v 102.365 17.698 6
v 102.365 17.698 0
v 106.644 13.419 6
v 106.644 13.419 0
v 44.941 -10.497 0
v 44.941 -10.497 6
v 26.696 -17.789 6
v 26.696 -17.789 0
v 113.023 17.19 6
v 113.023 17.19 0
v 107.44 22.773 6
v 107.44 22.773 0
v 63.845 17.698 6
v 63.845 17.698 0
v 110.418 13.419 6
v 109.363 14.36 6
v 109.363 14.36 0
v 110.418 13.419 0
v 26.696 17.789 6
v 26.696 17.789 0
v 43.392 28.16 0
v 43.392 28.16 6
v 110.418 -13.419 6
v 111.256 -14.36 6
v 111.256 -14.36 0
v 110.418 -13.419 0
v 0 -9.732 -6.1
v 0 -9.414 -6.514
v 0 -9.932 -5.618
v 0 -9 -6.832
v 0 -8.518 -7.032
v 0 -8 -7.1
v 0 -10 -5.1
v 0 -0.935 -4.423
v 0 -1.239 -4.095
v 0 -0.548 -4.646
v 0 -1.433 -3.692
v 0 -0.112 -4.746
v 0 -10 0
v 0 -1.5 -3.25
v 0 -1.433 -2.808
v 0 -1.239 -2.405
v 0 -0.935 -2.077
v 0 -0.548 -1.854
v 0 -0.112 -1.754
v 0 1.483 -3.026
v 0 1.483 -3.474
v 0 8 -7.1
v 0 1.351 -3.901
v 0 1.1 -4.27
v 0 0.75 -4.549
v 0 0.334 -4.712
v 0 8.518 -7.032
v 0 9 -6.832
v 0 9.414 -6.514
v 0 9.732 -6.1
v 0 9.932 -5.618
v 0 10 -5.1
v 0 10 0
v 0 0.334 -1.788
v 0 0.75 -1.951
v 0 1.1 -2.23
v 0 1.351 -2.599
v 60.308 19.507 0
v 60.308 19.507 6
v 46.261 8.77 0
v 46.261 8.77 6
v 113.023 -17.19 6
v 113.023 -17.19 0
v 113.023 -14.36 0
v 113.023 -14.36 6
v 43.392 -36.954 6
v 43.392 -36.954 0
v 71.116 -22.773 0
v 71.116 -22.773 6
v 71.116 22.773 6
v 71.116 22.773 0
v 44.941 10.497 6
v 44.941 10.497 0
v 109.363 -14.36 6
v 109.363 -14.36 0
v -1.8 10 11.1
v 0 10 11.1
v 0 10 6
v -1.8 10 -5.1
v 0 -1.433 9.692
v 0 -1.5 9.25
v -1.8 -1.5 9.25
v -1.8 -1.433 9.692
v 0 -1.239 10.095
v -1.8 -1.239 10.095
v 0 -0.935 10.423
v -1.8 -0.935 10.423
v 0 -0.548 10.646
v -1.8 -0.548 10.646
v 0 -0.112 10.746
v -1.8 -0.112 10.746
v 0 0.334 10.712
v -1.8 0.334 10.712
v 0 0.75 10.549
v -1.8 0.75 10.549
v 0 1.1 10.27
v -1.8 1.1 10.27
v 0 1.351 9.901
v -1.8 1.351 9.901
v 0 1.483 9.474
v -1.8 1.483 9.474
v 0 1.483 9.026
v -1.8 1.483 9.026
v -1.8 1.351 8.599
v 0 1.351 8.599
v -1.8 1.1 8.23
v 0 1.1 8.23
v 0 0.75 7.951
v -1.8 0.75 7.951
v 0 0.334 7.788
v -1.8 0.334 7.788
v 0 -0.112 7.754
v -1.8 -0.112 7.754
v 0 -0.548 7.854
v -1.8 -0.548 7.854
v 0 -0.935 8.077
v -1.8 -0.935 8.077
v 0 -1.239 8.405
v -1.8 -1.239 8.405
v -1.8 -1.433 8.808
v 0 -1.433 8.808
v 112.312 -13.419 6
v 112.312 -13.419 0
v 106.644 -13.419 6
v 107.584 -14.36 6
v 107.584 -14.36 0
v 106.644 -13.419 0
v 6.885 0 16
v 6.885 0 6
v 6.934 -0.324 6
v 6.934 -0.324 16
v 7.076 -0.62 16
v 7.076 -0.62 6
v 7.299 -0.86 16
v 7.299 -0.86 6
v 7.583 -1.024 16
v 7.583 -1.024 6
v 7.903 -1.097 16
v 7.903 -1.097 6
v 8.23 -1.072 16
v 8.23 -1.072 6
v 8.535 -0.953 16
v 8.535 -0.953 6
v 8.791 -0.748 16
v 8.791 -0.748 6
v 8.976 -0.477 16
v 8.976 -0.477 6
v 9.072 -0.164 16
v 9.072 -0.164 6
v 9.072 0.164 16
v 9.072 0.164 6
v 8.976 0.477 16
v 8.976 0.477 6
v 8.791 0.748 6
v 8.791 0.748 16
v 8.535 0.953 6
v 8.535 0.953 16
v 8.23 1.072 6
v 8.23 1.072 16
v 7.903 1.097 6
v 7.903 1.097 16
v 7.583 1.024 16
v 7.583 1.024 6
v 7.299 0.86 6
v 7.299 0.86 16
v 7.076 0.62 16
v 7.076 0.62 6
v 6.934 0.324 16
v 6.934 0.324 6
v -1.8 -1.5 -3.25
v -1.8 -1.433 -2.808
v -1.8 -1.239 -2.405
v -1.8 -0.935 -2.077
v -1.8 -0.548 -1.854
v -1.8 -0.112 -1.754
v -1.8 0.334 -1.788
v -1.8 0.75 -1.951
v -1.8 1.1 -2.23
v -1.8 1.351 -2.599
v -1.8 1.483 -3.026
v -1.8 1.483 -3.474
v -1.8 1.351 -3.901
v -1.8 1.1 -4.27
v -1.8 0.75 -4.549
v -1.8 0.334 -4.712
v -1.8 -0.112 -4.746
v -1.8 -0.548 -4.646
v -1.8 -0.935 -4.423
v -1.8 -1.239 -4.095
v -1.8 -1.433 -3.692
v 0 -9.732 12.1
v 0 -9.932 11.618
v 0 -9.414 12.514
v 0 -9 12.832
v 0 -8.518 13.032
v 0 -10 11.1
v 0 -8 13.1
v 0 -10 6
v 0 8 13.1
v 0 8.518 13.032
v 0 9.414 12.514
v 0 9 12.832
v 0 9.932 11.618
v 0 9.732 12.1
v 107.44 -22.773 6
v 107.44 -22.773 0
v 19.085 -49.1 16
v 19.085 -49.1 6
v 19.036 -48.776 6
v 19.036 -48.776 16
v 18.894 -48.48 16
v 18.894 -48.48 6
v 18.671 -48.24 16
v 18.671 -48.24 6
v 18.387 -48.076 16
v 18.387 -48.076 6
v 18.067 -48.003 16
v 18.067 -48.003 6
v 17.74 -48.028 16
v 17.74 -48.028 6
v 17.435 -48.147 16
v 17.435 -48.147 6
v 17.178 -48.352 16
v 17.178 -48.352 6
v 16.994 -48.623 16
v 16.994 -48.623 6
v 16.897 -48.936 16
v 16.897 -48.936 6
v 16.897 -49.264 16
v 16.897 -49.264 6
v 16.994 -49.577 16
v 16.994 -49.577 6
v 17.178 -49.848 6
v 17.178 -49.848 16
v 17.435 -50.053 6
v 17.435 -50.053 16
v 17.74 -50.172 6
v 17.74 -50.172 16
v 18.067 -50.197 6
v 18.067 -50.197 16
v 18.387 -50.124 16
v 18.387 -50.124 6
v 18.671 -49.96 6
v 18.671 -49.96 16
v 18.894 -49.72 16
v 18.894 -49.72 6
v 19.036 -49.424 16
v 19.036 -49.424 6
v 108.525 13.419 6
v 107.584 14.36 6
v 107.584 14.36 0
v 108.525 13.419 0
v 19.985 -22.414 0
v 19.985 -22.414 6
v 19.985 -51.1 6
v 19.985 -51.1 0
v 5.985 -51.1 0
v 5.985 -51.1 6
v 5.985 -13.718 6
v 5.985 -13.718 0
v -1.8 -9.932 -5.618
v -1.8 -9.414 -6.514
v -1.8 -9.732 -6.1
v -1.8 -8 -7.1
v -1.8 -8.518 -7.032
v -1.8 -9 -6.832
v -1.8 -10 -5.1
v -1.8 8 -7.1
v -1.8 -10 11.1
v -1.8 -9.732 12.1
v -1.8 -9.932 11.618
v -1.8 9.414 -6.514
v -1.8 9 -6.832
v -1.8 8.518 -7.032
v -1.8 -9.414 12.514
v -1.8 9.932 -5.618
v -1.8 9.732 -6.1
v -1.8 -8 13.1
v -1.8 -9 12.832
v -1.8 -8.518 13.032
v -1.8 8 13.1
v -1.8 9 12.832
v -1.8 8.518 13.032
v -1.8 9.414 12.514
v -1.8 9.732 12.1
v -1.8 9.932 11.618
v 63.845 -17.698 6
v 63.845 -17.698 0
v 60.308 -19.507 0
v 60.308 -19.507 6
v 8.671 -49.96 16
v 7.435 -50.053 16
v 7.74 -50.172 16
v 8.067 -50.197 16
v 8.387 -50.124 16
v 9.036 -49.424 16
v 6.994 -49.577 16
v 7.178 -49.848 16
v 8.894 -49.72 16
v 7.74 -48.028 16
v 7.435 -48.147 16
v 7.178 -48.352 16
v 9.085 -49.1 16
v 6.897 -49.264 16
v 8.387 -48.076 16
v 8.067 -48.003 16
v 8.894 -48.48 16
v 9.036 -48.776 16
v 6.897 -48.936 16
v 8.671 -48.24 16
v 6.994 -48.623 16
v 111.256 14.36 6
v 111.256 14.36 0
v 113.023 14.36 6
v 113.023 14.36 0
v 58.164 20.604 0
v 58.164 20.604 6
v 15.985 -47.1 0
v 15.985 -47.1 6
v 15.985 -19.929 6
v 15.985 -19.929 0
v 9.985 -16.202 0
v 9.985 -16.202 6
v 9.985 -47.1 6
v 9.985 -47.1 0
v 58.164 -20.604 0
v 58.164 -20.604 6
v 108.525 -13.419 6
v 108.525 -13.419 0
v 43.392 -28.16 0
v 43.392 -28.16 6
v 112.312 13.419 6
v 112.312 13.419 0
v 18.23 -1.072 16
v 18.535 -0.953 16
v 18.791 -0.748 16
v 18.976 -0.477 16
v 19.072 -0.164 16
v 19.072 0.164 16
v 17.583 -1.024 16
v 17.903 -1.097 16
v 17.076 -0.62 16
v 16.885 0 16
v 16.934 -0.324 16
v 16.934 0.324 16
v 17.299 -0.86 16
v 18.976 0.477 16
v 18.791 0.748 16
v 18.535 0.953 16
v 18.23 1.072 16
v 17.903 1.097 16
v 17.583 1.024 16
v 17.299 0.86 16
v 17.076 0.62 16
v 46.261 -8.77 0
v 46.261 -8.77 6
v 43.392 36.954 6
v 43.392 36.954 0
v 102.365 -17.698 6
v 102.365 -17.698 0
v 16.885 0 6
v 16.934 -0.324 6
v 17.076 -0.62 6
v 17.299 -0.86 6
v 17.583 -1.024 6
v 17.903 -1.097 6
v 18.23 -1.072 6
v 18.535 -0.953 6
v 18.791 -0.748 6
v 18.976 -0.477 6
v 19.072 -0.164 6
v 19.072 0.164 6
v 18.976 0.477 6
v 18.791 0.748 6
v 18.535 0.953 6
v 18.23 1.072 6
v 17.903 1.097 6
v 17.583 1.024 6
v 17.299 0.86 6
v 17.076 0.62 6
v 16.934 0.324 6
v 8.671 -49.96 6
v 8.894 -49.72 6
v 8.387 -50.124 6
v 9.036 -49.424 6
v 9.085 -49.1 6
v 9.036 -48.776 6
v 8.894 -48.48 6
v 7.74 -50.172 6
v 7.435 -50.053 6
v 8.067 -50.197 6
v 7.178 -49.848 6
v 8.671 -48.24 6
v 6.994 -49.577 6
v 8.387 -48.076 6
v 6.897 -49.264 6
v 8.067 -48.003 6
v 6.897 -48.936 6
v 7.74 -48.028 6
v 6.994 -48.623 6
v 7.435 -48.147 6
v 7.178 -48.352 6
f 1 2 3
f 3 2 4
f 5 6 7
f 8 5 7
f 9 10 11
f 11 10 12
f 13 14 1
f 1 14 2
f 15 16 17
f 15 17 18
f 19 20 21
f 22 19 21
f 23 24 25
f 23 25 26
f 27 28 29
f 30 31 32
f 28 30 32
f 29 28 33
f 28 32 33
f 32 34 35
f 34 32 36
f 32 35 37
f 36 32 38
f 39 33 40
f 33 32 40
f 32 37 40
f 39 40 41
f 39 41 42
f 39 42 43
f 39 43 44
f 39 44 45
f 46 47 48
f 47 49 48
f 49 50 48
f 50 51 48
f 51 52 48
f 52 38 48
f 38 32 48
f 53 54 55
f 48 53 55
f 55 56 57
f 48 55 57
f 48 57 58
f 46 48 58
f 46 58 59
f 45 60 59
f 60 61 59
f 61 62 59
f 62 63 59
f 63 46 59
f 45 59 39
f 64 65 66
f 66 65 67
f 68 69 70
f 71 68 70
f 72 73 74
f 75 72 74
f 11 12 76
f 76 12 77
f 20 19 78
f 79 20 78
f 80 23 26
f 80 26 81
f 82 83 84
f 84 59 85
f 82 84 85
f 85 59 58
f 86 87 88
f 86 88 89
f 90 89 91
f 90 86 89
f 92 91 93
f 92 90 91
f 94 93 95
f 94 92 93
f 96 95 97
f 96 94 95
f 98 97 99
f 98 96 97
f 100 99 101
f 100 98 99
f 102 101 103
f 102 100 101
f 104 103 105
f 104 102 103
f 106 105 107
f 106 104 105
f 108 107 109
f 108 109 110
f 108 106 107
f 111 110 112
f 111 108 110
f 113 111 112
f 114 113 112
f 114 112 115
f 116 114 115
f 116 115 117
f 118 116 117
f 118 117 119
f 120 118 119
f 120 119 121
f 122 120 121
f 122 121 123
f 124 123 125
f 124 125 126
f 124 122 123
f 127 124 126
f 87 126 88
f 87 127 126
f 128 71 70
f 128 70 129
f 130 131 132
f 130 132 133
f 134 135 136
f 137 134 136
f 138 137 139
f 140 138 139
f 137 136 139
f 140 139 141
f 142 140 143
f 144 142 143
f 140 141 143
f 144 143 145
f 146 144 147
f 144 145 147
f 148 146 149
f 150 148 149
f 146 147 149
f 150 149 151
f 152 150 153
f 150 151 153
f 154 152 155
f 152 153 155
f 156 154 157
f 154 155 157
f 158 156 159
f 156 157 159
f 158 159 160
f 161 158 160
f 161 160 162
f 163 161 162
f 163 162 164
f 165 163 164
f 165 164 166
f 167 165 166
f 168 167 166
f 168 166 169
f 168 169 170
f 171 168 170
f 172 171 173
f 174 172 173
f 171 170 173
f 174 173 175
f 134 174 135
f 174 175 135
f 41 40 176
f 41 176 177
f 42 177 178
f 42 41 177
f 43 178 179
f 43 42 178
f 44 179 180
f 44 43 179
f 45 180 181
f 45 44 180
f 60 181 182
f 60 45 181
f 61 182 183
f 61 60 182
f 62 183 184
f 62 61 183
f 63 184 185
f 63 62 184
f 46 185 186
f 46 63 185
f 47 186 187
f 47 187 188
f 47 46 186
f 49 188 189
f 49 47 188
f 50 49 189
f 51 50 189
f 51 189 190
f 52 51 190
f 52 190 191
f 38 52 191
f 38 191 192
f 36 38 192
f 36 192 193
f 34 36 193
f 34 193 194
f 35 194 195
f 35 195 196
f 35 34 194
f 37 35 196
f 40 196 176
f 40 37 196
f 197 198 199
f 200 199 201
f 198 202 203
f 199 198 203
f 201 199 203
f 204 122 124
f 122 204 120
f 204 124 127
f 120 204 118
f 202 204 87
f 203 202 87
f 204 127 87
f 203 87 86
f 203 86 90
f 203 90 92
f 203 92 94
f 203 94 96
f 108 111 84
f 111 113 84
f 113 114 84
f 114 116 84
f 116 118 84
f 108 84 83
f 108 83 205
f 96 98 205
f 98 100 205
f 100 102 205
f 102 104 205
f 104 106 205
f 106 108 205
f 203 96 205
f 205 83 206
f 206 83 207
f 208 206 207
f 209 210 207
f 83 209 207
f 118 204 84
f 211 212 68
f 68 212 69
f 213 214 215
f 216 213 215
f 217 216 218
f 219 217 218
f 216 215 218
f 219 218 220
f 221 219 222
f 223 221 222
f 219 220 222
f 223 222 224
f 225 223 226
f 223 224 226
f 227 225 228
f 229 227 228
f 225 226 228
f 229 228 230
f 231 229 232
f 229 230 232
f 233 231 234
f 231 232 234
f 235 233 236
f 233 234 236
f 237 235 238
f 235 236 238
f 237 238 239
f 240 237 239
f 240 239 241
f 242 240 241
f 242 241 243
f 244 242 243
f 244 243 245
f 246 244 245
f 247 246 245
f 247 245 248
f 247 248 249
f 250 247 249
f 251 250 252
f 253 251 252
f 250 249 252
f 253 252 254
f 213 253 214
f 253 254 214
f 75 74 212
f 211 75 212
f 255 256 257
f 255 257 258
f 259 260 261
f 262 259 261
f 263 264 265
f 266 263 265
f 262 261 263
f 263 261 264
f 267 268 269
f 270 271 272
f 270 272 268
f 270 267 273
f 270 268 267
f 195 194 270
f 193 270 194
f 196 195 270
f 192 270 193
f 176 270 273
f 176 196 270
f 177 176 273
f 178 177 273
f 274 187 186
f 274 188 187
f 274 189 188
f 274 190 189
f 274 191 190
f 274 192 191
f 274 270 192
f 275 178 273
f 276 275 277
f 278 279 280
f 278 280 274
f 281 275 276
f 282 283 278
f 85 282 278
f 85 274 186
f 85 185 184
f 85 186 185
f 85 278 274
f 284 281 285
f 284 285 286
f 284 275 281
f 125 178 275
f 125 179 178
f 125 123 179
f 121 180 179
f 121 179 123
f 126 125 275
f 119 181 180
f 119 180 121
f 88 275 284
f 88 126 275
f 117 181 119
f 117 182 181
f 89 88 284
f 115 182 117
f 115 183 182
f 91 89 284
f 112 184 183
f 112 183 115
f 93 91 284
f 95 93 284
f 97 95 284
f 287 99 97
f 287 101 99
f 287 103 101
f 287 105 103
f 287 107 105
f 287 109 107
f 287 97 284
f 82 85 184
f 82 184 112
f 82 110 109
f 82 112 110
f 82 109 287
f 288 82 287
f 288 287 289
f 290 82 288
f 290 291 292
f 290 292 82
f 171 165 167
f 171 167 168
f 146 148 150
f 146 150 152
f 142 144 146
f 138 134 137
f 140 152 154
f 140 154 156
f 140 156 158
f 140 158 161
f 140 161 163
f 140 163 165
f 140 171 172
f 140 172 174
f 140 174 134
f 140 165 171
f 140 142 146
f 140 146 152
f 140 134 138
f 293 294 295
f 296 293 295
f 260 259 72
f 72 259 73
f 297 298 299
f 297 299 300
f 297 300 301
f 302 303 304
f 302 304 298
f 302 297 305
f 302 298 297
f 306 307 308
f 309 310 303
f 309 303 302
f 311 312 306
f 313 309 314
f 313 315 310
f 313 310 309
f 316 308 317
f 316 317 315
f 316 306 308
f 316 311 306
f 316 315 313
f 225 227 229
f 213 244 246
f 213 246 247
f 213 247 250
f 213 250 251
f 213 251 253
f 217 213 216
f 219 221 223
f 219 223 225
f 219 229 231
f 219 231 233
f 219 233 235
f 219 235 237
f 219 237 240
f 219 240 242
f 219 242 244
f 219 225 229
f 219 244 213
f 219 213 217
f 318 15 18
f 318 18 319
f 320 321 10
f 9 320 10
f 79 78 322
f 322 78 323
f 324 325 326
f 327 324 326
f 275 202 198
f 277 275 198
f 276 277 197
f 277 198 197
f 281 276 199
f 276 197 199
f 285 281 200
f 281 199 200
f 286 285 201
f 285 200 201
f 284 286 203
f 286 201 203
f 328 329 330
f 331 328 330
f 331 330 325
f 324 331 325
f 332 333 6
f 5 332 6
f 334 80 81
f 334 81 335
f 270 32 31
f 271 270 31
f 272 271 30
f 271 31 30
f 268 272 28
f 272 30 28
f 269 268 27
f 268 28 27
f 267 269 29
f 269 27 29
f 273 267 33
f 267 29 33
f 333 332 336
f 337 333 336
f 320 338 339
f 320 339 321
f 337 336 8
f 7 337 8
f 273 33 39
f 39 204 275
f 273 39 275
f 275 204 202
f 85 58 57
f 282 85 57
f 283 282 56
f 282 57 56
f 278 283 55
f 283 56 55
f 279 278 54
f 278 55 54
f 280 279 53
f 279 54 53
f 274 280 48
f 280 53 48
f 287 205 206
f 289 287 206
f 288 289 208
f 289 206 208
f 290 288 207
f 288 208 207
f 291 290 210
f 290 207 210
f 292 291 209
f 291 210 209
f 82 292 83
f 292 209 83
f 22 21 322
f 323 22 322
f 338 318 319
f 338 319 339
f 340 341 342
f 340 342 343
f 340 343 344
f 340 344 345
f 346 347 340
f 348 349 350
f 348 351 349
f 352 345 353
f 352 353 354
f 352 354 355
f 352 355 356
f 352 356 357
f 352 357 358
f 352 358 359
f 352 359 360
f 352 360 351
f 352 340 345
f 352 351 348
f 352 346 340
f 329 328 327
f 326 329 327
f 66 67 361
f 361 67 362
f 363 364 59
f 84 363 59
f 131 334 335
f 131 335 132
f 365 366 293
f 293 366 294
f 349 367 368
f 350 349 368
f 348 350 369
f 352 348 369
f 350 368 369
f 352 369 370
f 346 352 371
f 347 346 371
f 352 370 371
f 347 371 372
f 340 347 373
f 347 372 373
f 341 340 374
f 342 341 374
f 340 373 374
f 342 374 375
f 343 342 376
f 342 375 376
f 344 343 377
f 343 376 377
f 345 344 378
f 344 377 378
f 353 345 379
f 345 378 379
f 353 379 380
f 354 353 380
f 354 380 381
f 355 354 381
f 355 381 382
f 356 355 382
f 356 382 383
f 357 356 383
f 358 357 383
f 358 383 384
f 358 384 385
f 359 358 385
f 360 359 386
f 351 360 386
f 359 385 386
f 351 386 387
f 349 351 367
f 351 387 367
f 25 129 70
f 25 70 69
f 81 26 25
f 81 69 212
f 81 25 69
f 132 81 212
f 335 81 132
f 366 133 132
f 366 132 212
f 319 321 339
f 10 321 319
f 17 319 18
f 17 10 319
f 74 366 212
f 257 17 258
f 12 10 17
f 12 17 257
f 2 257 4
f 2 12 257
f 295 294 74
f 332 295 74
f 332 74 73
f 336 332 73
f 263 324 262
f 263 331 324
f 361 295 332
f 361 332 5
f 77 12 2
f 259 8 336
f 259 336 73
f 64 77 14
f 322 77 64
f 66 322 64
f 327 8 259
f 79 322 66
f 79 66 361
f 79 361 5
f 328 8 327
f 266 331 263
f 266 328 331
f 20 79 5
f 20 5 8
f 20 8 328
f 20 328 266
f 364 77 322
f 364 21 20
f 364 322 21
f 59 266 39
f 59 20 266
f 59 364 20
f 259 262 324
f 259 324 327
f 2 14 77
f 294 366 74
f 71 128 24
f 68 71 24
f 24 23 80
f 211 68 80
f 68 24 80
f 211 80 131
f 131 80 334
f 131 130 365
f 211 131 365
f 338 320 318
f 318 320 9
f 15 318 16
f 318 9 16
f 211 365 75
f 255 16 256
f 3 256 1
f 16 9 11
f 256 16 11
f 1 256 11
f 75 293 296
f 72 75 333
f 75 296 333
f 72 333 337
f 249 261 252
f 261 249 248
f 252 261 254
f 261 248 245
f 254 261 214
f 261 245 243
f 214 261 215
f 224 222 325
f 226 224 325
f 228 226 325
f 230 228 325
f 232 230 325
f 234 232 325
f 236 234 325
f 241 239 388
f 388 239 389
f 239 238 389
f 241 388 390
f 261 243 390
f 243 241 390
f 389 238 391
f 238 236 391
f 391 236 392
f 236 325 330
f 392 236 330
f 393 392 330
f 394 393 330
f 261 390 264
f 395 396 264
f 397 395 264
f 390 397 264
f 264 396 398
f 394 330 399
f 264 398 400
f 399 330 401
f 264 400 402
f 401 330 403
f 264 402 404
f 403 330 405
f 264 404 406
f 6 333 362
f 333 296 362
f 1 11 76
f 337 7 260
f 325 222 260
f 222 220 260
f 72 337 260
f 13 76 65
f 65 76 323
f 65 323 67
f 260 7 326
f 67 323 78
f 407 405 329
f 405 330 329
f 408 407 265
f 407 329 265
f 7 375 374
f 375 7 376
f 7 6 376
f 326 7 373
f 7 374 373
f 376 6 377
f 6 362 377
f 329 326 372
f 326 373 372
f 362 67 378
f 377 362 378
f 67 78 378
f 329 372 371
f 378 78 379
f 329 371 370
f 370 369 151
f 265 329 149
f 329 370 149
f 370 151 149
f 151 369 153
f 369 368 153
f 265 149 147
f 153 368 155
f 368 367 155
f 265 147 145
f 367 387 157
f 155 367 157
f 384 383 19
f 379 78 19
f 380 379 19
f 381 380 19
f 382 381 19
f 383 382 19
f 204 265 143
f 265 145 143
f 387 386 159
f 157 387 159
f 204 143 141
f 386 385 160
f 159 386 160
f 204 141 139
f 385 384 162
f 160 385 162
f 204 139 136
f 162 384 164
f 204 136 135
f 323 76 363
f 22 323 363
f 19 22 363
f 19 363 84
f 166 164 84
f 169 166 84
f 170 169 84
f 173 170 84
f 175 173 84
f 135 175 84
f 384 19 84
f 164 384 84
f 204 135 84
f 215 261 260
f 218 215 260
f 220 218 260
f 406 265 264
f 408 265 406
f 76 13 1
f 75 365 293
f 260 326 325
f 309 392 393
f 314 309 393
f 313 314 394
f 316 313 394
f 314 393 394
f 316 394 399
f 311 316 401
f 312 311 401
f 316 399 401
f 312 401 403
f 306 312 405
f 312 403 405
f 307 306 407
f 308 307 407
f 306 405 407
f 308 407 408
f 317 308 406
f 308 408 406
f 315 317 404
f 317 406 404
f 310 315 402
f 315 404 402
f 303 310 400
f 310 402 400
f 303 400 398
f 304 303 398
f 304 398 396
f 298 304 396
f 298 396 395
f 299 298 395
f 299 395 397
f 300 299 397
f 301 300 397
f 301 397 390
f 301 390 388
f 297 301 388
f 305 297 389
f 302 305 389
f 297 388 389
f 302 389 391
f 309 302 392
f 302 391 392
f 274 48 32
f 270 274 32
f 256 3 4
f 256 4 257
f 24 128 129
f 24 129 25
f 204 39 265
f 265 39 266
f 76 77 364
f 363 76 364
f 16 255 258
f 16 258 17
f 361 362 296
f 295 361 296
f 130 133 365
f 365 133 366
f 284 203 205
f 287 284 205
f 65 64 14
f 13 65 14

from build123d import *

# Parameters (mm, degrees)
EXTRUDE_1_DEPTH = 6
EXTRUDE_2_DEPTH = 6
EXTRUDE_3_DEPTH = 6
SKETCH_4_R      = 1.5
EXTRUDE_4_DEPTH = 1.8
SKETCH_5_R      = 1.1
EXTRUDE_5_DEPTH = 10
EXTRUDE_6_DEPTH = 6


with BuildPart() as part:
    # 草图1 → 凸台-拉伸1 (new body)
    with BuildSketch(Plane.XY):
        Polygon((0, 10), (0, -10), (43.391858736, -36.953542991), (71.115712236, -22.772903722), (107.439932669, -22.772903722), (113.022851841, -17.18998455), (113.022851841, -14.359848661), (105.70299447, -14.359848661), (102.364936039, -17.697907092), (63.844827478, -17.697907092), (43.391858736, -28.159518127), (15.650074222, -10.927267577), (15.650074222, 10.927267577), (43.391858736, 28.159518127), (63.844827478, 17.697907092), (102.364936039, 17.697907092), (105.70299447, 14.359848661), (113.022851841, 14.359848661), (113.022851841, 17.18998455), (107.439932669, 22.772903722), (71.115712236, 22.772903722), (43.391858736, 36.953542991), align=None)
    extrude(amount=EXTRUDE_1_DEPTH)

    # 草图2 → 凸台-拉伸2 (add)
    with BuildSketch(Plane.XY.offset(6)):
        Polygon((113.022851841, 14.359848661), (111.256497416, 14.359848661), (112.311790012, 13.419299654), align=None)
        Polygon((111.256497416, 14.359848661), (109.362923156, 14.359848661), (110.418215751, 13.419299654), align=None)
        Polygon((109.362923156, 14.359848661), (107.584092484, 14.359848661), (108.52464149, 13.419299654), align=None)
        Polygon((107.584092484, 14.359848661), (105.70299447, 14.359848661), (106.643543477, 13.419299654), align=None)
        Polygon((105.70299447, -14.359848661), (107.584092484, -14.359848661), (106.643543477, -13.419299654), align=None)
        Polygon((107.584092484, -14.359848661), (109.362923156, -14.359848661), (108.52464149, -13.419299654), align=None)
        Polygon((109.362923156, -14.359848661), (111.256497416, -14.359848661), (110.418215751, -13.419299654), align=None)
        Polygon((111.256497416, -14.359848661), (113.022851841, -14.359848661), (112.311790012, -13.419299654), align=None)
    extrude(amount=-EXTRUDE_2_DEPTH)

    # 草图3 → 凸台-拉伸3 (add)
    with BuildSketch(Plane.XY.offset(6)):
        Polygon((26.69644411, 17.788895872), (44.940516172, 10.497320184), (61.640798283, 23.261107226), (62.960793136, 21.534011156), (46.260511025, 8.770224115), (46.260511025, -8.770224115), (62.960793136, -21.534011156), (61.640798283, -23.261107226), (44.940516172, -10.497320184), (26.69644411, -17.788895872), (15.650074222, -10.927267577), (15.650074222, 10.927267577), align=None)
    extrude(amount=-EXTRUDE_3_DEPTH)

    # 草图4 → 凸台-拉伸4 (add)
    with BuildSketch(Plane.ZY):
        with BuildLine():
            Line((-5.1, -10), (11.1, -10))
            ThreePointArc((11.1, -10), (12.514213562, -9.414213562), (13.1, -8))
            Line((13.1, -8), (13.1, 8))
            ThreePointArc((13.1, 8), (12.514213562, 9.414213562), (11.1, 10))
            Line((11.1, 10), (-5.1, 10))
            ThreePointArc((-5.1, 10), (-6.514213562, 9.414213562), (-7.1, 8))
            Line((-7.1, 8), (-7.1, -8))
            ThreePointArc((-7.1, -8), (-6.514213562, -9.414213562), (-5.1, -10))
        make_face()
        with Locations(Location((9.25, 0, 0), (0, 0, 270))):
            Circle(SKETCH_4_R, mode=Mode.SUBTRACT)
        with Locations(Location((-3.25, 0, 0), (0, 0, 270))):
            Circle(SKETCH_4_R, mode=Mode.SUBTRACT)
    extrude(amount=EXTRUDE_4_DEPTH)

    # 草图5 → 凸台-拉伸5 (add)
    with BuildSketch(Plane.XY.offset(6)):
        with Locations(Location((17.984736969, 0, 0), (0, 0, 180))):
            Circle(SKETCH_5_R)
        with Locations(Location((7.984736969, 0, 0), (0, 0, 180))):
            Circle(SKETCH_5_R)
        with Locations((7.984736969, -49.1)):
            Circle(SKETCH_5_R)
        with Locations((17.984736969, -49.1)):
            Circle(SKETCH_5_R)
    extrude(amount=EXTRUDE_5_DEPTH)


with BuildPart() as extrude_5_piece_1:
    # of the separate pieces the step leaves, piece 1, a body of its own (extrude_5_pieces)
    add(part.part.solids().sort_by_distance((0, -10, -5.1))[0])



with BuildPart() as extrude_5_piece_2:
    # of the separate pieces the step leaves, piece 2, a body of its own (extrude_5_pieces)
    add(part.part.solids().sort_by_distance((9.084736969, -49.1, 6))[0])


with BuildPart() as extrude_5_piece_3:
    # of the separate pieces the step leaves, piece 3, a body of its own (extrude_5_pieces)
    add(part.part.solids().sort_by_distance((19.084736969, -49.1, 6))[0])


with BuildPart() as extrude_5_piece_1_1:
    add(extrude_5_piece_1.part)

    add(extrude_5_piece_2.part)  # 凸台-拉伸6 merges 凸台-拉伸5 piece 2

    add(extrude_5_piece_3.part)  # 凸台-拉伸6 merges 凸台-拉伸5 piece 3
    # 草图6 → 凸台-拉伸6 (add)
    with BuildSketch(Plane(origin=(0, 0, 6), x_dir=(-1, 0, 0), z_dir=(0, 0, -1))):
        Polygon((-15.984736969, -19.929173528), (-19.984736969, -22.413837129), (-19.984736969, -51.1), (-5.984736969, -51.1), (-5.984736969, -13.717514526), (-9.984736969, -16.202178127), (-9.984736969, -47.1), (-15.984736969, -47.1), align=None)
    extrude(amount=EXTRUDE_6_DEPTH)


solid = extrude_5_piece_1_1.part
